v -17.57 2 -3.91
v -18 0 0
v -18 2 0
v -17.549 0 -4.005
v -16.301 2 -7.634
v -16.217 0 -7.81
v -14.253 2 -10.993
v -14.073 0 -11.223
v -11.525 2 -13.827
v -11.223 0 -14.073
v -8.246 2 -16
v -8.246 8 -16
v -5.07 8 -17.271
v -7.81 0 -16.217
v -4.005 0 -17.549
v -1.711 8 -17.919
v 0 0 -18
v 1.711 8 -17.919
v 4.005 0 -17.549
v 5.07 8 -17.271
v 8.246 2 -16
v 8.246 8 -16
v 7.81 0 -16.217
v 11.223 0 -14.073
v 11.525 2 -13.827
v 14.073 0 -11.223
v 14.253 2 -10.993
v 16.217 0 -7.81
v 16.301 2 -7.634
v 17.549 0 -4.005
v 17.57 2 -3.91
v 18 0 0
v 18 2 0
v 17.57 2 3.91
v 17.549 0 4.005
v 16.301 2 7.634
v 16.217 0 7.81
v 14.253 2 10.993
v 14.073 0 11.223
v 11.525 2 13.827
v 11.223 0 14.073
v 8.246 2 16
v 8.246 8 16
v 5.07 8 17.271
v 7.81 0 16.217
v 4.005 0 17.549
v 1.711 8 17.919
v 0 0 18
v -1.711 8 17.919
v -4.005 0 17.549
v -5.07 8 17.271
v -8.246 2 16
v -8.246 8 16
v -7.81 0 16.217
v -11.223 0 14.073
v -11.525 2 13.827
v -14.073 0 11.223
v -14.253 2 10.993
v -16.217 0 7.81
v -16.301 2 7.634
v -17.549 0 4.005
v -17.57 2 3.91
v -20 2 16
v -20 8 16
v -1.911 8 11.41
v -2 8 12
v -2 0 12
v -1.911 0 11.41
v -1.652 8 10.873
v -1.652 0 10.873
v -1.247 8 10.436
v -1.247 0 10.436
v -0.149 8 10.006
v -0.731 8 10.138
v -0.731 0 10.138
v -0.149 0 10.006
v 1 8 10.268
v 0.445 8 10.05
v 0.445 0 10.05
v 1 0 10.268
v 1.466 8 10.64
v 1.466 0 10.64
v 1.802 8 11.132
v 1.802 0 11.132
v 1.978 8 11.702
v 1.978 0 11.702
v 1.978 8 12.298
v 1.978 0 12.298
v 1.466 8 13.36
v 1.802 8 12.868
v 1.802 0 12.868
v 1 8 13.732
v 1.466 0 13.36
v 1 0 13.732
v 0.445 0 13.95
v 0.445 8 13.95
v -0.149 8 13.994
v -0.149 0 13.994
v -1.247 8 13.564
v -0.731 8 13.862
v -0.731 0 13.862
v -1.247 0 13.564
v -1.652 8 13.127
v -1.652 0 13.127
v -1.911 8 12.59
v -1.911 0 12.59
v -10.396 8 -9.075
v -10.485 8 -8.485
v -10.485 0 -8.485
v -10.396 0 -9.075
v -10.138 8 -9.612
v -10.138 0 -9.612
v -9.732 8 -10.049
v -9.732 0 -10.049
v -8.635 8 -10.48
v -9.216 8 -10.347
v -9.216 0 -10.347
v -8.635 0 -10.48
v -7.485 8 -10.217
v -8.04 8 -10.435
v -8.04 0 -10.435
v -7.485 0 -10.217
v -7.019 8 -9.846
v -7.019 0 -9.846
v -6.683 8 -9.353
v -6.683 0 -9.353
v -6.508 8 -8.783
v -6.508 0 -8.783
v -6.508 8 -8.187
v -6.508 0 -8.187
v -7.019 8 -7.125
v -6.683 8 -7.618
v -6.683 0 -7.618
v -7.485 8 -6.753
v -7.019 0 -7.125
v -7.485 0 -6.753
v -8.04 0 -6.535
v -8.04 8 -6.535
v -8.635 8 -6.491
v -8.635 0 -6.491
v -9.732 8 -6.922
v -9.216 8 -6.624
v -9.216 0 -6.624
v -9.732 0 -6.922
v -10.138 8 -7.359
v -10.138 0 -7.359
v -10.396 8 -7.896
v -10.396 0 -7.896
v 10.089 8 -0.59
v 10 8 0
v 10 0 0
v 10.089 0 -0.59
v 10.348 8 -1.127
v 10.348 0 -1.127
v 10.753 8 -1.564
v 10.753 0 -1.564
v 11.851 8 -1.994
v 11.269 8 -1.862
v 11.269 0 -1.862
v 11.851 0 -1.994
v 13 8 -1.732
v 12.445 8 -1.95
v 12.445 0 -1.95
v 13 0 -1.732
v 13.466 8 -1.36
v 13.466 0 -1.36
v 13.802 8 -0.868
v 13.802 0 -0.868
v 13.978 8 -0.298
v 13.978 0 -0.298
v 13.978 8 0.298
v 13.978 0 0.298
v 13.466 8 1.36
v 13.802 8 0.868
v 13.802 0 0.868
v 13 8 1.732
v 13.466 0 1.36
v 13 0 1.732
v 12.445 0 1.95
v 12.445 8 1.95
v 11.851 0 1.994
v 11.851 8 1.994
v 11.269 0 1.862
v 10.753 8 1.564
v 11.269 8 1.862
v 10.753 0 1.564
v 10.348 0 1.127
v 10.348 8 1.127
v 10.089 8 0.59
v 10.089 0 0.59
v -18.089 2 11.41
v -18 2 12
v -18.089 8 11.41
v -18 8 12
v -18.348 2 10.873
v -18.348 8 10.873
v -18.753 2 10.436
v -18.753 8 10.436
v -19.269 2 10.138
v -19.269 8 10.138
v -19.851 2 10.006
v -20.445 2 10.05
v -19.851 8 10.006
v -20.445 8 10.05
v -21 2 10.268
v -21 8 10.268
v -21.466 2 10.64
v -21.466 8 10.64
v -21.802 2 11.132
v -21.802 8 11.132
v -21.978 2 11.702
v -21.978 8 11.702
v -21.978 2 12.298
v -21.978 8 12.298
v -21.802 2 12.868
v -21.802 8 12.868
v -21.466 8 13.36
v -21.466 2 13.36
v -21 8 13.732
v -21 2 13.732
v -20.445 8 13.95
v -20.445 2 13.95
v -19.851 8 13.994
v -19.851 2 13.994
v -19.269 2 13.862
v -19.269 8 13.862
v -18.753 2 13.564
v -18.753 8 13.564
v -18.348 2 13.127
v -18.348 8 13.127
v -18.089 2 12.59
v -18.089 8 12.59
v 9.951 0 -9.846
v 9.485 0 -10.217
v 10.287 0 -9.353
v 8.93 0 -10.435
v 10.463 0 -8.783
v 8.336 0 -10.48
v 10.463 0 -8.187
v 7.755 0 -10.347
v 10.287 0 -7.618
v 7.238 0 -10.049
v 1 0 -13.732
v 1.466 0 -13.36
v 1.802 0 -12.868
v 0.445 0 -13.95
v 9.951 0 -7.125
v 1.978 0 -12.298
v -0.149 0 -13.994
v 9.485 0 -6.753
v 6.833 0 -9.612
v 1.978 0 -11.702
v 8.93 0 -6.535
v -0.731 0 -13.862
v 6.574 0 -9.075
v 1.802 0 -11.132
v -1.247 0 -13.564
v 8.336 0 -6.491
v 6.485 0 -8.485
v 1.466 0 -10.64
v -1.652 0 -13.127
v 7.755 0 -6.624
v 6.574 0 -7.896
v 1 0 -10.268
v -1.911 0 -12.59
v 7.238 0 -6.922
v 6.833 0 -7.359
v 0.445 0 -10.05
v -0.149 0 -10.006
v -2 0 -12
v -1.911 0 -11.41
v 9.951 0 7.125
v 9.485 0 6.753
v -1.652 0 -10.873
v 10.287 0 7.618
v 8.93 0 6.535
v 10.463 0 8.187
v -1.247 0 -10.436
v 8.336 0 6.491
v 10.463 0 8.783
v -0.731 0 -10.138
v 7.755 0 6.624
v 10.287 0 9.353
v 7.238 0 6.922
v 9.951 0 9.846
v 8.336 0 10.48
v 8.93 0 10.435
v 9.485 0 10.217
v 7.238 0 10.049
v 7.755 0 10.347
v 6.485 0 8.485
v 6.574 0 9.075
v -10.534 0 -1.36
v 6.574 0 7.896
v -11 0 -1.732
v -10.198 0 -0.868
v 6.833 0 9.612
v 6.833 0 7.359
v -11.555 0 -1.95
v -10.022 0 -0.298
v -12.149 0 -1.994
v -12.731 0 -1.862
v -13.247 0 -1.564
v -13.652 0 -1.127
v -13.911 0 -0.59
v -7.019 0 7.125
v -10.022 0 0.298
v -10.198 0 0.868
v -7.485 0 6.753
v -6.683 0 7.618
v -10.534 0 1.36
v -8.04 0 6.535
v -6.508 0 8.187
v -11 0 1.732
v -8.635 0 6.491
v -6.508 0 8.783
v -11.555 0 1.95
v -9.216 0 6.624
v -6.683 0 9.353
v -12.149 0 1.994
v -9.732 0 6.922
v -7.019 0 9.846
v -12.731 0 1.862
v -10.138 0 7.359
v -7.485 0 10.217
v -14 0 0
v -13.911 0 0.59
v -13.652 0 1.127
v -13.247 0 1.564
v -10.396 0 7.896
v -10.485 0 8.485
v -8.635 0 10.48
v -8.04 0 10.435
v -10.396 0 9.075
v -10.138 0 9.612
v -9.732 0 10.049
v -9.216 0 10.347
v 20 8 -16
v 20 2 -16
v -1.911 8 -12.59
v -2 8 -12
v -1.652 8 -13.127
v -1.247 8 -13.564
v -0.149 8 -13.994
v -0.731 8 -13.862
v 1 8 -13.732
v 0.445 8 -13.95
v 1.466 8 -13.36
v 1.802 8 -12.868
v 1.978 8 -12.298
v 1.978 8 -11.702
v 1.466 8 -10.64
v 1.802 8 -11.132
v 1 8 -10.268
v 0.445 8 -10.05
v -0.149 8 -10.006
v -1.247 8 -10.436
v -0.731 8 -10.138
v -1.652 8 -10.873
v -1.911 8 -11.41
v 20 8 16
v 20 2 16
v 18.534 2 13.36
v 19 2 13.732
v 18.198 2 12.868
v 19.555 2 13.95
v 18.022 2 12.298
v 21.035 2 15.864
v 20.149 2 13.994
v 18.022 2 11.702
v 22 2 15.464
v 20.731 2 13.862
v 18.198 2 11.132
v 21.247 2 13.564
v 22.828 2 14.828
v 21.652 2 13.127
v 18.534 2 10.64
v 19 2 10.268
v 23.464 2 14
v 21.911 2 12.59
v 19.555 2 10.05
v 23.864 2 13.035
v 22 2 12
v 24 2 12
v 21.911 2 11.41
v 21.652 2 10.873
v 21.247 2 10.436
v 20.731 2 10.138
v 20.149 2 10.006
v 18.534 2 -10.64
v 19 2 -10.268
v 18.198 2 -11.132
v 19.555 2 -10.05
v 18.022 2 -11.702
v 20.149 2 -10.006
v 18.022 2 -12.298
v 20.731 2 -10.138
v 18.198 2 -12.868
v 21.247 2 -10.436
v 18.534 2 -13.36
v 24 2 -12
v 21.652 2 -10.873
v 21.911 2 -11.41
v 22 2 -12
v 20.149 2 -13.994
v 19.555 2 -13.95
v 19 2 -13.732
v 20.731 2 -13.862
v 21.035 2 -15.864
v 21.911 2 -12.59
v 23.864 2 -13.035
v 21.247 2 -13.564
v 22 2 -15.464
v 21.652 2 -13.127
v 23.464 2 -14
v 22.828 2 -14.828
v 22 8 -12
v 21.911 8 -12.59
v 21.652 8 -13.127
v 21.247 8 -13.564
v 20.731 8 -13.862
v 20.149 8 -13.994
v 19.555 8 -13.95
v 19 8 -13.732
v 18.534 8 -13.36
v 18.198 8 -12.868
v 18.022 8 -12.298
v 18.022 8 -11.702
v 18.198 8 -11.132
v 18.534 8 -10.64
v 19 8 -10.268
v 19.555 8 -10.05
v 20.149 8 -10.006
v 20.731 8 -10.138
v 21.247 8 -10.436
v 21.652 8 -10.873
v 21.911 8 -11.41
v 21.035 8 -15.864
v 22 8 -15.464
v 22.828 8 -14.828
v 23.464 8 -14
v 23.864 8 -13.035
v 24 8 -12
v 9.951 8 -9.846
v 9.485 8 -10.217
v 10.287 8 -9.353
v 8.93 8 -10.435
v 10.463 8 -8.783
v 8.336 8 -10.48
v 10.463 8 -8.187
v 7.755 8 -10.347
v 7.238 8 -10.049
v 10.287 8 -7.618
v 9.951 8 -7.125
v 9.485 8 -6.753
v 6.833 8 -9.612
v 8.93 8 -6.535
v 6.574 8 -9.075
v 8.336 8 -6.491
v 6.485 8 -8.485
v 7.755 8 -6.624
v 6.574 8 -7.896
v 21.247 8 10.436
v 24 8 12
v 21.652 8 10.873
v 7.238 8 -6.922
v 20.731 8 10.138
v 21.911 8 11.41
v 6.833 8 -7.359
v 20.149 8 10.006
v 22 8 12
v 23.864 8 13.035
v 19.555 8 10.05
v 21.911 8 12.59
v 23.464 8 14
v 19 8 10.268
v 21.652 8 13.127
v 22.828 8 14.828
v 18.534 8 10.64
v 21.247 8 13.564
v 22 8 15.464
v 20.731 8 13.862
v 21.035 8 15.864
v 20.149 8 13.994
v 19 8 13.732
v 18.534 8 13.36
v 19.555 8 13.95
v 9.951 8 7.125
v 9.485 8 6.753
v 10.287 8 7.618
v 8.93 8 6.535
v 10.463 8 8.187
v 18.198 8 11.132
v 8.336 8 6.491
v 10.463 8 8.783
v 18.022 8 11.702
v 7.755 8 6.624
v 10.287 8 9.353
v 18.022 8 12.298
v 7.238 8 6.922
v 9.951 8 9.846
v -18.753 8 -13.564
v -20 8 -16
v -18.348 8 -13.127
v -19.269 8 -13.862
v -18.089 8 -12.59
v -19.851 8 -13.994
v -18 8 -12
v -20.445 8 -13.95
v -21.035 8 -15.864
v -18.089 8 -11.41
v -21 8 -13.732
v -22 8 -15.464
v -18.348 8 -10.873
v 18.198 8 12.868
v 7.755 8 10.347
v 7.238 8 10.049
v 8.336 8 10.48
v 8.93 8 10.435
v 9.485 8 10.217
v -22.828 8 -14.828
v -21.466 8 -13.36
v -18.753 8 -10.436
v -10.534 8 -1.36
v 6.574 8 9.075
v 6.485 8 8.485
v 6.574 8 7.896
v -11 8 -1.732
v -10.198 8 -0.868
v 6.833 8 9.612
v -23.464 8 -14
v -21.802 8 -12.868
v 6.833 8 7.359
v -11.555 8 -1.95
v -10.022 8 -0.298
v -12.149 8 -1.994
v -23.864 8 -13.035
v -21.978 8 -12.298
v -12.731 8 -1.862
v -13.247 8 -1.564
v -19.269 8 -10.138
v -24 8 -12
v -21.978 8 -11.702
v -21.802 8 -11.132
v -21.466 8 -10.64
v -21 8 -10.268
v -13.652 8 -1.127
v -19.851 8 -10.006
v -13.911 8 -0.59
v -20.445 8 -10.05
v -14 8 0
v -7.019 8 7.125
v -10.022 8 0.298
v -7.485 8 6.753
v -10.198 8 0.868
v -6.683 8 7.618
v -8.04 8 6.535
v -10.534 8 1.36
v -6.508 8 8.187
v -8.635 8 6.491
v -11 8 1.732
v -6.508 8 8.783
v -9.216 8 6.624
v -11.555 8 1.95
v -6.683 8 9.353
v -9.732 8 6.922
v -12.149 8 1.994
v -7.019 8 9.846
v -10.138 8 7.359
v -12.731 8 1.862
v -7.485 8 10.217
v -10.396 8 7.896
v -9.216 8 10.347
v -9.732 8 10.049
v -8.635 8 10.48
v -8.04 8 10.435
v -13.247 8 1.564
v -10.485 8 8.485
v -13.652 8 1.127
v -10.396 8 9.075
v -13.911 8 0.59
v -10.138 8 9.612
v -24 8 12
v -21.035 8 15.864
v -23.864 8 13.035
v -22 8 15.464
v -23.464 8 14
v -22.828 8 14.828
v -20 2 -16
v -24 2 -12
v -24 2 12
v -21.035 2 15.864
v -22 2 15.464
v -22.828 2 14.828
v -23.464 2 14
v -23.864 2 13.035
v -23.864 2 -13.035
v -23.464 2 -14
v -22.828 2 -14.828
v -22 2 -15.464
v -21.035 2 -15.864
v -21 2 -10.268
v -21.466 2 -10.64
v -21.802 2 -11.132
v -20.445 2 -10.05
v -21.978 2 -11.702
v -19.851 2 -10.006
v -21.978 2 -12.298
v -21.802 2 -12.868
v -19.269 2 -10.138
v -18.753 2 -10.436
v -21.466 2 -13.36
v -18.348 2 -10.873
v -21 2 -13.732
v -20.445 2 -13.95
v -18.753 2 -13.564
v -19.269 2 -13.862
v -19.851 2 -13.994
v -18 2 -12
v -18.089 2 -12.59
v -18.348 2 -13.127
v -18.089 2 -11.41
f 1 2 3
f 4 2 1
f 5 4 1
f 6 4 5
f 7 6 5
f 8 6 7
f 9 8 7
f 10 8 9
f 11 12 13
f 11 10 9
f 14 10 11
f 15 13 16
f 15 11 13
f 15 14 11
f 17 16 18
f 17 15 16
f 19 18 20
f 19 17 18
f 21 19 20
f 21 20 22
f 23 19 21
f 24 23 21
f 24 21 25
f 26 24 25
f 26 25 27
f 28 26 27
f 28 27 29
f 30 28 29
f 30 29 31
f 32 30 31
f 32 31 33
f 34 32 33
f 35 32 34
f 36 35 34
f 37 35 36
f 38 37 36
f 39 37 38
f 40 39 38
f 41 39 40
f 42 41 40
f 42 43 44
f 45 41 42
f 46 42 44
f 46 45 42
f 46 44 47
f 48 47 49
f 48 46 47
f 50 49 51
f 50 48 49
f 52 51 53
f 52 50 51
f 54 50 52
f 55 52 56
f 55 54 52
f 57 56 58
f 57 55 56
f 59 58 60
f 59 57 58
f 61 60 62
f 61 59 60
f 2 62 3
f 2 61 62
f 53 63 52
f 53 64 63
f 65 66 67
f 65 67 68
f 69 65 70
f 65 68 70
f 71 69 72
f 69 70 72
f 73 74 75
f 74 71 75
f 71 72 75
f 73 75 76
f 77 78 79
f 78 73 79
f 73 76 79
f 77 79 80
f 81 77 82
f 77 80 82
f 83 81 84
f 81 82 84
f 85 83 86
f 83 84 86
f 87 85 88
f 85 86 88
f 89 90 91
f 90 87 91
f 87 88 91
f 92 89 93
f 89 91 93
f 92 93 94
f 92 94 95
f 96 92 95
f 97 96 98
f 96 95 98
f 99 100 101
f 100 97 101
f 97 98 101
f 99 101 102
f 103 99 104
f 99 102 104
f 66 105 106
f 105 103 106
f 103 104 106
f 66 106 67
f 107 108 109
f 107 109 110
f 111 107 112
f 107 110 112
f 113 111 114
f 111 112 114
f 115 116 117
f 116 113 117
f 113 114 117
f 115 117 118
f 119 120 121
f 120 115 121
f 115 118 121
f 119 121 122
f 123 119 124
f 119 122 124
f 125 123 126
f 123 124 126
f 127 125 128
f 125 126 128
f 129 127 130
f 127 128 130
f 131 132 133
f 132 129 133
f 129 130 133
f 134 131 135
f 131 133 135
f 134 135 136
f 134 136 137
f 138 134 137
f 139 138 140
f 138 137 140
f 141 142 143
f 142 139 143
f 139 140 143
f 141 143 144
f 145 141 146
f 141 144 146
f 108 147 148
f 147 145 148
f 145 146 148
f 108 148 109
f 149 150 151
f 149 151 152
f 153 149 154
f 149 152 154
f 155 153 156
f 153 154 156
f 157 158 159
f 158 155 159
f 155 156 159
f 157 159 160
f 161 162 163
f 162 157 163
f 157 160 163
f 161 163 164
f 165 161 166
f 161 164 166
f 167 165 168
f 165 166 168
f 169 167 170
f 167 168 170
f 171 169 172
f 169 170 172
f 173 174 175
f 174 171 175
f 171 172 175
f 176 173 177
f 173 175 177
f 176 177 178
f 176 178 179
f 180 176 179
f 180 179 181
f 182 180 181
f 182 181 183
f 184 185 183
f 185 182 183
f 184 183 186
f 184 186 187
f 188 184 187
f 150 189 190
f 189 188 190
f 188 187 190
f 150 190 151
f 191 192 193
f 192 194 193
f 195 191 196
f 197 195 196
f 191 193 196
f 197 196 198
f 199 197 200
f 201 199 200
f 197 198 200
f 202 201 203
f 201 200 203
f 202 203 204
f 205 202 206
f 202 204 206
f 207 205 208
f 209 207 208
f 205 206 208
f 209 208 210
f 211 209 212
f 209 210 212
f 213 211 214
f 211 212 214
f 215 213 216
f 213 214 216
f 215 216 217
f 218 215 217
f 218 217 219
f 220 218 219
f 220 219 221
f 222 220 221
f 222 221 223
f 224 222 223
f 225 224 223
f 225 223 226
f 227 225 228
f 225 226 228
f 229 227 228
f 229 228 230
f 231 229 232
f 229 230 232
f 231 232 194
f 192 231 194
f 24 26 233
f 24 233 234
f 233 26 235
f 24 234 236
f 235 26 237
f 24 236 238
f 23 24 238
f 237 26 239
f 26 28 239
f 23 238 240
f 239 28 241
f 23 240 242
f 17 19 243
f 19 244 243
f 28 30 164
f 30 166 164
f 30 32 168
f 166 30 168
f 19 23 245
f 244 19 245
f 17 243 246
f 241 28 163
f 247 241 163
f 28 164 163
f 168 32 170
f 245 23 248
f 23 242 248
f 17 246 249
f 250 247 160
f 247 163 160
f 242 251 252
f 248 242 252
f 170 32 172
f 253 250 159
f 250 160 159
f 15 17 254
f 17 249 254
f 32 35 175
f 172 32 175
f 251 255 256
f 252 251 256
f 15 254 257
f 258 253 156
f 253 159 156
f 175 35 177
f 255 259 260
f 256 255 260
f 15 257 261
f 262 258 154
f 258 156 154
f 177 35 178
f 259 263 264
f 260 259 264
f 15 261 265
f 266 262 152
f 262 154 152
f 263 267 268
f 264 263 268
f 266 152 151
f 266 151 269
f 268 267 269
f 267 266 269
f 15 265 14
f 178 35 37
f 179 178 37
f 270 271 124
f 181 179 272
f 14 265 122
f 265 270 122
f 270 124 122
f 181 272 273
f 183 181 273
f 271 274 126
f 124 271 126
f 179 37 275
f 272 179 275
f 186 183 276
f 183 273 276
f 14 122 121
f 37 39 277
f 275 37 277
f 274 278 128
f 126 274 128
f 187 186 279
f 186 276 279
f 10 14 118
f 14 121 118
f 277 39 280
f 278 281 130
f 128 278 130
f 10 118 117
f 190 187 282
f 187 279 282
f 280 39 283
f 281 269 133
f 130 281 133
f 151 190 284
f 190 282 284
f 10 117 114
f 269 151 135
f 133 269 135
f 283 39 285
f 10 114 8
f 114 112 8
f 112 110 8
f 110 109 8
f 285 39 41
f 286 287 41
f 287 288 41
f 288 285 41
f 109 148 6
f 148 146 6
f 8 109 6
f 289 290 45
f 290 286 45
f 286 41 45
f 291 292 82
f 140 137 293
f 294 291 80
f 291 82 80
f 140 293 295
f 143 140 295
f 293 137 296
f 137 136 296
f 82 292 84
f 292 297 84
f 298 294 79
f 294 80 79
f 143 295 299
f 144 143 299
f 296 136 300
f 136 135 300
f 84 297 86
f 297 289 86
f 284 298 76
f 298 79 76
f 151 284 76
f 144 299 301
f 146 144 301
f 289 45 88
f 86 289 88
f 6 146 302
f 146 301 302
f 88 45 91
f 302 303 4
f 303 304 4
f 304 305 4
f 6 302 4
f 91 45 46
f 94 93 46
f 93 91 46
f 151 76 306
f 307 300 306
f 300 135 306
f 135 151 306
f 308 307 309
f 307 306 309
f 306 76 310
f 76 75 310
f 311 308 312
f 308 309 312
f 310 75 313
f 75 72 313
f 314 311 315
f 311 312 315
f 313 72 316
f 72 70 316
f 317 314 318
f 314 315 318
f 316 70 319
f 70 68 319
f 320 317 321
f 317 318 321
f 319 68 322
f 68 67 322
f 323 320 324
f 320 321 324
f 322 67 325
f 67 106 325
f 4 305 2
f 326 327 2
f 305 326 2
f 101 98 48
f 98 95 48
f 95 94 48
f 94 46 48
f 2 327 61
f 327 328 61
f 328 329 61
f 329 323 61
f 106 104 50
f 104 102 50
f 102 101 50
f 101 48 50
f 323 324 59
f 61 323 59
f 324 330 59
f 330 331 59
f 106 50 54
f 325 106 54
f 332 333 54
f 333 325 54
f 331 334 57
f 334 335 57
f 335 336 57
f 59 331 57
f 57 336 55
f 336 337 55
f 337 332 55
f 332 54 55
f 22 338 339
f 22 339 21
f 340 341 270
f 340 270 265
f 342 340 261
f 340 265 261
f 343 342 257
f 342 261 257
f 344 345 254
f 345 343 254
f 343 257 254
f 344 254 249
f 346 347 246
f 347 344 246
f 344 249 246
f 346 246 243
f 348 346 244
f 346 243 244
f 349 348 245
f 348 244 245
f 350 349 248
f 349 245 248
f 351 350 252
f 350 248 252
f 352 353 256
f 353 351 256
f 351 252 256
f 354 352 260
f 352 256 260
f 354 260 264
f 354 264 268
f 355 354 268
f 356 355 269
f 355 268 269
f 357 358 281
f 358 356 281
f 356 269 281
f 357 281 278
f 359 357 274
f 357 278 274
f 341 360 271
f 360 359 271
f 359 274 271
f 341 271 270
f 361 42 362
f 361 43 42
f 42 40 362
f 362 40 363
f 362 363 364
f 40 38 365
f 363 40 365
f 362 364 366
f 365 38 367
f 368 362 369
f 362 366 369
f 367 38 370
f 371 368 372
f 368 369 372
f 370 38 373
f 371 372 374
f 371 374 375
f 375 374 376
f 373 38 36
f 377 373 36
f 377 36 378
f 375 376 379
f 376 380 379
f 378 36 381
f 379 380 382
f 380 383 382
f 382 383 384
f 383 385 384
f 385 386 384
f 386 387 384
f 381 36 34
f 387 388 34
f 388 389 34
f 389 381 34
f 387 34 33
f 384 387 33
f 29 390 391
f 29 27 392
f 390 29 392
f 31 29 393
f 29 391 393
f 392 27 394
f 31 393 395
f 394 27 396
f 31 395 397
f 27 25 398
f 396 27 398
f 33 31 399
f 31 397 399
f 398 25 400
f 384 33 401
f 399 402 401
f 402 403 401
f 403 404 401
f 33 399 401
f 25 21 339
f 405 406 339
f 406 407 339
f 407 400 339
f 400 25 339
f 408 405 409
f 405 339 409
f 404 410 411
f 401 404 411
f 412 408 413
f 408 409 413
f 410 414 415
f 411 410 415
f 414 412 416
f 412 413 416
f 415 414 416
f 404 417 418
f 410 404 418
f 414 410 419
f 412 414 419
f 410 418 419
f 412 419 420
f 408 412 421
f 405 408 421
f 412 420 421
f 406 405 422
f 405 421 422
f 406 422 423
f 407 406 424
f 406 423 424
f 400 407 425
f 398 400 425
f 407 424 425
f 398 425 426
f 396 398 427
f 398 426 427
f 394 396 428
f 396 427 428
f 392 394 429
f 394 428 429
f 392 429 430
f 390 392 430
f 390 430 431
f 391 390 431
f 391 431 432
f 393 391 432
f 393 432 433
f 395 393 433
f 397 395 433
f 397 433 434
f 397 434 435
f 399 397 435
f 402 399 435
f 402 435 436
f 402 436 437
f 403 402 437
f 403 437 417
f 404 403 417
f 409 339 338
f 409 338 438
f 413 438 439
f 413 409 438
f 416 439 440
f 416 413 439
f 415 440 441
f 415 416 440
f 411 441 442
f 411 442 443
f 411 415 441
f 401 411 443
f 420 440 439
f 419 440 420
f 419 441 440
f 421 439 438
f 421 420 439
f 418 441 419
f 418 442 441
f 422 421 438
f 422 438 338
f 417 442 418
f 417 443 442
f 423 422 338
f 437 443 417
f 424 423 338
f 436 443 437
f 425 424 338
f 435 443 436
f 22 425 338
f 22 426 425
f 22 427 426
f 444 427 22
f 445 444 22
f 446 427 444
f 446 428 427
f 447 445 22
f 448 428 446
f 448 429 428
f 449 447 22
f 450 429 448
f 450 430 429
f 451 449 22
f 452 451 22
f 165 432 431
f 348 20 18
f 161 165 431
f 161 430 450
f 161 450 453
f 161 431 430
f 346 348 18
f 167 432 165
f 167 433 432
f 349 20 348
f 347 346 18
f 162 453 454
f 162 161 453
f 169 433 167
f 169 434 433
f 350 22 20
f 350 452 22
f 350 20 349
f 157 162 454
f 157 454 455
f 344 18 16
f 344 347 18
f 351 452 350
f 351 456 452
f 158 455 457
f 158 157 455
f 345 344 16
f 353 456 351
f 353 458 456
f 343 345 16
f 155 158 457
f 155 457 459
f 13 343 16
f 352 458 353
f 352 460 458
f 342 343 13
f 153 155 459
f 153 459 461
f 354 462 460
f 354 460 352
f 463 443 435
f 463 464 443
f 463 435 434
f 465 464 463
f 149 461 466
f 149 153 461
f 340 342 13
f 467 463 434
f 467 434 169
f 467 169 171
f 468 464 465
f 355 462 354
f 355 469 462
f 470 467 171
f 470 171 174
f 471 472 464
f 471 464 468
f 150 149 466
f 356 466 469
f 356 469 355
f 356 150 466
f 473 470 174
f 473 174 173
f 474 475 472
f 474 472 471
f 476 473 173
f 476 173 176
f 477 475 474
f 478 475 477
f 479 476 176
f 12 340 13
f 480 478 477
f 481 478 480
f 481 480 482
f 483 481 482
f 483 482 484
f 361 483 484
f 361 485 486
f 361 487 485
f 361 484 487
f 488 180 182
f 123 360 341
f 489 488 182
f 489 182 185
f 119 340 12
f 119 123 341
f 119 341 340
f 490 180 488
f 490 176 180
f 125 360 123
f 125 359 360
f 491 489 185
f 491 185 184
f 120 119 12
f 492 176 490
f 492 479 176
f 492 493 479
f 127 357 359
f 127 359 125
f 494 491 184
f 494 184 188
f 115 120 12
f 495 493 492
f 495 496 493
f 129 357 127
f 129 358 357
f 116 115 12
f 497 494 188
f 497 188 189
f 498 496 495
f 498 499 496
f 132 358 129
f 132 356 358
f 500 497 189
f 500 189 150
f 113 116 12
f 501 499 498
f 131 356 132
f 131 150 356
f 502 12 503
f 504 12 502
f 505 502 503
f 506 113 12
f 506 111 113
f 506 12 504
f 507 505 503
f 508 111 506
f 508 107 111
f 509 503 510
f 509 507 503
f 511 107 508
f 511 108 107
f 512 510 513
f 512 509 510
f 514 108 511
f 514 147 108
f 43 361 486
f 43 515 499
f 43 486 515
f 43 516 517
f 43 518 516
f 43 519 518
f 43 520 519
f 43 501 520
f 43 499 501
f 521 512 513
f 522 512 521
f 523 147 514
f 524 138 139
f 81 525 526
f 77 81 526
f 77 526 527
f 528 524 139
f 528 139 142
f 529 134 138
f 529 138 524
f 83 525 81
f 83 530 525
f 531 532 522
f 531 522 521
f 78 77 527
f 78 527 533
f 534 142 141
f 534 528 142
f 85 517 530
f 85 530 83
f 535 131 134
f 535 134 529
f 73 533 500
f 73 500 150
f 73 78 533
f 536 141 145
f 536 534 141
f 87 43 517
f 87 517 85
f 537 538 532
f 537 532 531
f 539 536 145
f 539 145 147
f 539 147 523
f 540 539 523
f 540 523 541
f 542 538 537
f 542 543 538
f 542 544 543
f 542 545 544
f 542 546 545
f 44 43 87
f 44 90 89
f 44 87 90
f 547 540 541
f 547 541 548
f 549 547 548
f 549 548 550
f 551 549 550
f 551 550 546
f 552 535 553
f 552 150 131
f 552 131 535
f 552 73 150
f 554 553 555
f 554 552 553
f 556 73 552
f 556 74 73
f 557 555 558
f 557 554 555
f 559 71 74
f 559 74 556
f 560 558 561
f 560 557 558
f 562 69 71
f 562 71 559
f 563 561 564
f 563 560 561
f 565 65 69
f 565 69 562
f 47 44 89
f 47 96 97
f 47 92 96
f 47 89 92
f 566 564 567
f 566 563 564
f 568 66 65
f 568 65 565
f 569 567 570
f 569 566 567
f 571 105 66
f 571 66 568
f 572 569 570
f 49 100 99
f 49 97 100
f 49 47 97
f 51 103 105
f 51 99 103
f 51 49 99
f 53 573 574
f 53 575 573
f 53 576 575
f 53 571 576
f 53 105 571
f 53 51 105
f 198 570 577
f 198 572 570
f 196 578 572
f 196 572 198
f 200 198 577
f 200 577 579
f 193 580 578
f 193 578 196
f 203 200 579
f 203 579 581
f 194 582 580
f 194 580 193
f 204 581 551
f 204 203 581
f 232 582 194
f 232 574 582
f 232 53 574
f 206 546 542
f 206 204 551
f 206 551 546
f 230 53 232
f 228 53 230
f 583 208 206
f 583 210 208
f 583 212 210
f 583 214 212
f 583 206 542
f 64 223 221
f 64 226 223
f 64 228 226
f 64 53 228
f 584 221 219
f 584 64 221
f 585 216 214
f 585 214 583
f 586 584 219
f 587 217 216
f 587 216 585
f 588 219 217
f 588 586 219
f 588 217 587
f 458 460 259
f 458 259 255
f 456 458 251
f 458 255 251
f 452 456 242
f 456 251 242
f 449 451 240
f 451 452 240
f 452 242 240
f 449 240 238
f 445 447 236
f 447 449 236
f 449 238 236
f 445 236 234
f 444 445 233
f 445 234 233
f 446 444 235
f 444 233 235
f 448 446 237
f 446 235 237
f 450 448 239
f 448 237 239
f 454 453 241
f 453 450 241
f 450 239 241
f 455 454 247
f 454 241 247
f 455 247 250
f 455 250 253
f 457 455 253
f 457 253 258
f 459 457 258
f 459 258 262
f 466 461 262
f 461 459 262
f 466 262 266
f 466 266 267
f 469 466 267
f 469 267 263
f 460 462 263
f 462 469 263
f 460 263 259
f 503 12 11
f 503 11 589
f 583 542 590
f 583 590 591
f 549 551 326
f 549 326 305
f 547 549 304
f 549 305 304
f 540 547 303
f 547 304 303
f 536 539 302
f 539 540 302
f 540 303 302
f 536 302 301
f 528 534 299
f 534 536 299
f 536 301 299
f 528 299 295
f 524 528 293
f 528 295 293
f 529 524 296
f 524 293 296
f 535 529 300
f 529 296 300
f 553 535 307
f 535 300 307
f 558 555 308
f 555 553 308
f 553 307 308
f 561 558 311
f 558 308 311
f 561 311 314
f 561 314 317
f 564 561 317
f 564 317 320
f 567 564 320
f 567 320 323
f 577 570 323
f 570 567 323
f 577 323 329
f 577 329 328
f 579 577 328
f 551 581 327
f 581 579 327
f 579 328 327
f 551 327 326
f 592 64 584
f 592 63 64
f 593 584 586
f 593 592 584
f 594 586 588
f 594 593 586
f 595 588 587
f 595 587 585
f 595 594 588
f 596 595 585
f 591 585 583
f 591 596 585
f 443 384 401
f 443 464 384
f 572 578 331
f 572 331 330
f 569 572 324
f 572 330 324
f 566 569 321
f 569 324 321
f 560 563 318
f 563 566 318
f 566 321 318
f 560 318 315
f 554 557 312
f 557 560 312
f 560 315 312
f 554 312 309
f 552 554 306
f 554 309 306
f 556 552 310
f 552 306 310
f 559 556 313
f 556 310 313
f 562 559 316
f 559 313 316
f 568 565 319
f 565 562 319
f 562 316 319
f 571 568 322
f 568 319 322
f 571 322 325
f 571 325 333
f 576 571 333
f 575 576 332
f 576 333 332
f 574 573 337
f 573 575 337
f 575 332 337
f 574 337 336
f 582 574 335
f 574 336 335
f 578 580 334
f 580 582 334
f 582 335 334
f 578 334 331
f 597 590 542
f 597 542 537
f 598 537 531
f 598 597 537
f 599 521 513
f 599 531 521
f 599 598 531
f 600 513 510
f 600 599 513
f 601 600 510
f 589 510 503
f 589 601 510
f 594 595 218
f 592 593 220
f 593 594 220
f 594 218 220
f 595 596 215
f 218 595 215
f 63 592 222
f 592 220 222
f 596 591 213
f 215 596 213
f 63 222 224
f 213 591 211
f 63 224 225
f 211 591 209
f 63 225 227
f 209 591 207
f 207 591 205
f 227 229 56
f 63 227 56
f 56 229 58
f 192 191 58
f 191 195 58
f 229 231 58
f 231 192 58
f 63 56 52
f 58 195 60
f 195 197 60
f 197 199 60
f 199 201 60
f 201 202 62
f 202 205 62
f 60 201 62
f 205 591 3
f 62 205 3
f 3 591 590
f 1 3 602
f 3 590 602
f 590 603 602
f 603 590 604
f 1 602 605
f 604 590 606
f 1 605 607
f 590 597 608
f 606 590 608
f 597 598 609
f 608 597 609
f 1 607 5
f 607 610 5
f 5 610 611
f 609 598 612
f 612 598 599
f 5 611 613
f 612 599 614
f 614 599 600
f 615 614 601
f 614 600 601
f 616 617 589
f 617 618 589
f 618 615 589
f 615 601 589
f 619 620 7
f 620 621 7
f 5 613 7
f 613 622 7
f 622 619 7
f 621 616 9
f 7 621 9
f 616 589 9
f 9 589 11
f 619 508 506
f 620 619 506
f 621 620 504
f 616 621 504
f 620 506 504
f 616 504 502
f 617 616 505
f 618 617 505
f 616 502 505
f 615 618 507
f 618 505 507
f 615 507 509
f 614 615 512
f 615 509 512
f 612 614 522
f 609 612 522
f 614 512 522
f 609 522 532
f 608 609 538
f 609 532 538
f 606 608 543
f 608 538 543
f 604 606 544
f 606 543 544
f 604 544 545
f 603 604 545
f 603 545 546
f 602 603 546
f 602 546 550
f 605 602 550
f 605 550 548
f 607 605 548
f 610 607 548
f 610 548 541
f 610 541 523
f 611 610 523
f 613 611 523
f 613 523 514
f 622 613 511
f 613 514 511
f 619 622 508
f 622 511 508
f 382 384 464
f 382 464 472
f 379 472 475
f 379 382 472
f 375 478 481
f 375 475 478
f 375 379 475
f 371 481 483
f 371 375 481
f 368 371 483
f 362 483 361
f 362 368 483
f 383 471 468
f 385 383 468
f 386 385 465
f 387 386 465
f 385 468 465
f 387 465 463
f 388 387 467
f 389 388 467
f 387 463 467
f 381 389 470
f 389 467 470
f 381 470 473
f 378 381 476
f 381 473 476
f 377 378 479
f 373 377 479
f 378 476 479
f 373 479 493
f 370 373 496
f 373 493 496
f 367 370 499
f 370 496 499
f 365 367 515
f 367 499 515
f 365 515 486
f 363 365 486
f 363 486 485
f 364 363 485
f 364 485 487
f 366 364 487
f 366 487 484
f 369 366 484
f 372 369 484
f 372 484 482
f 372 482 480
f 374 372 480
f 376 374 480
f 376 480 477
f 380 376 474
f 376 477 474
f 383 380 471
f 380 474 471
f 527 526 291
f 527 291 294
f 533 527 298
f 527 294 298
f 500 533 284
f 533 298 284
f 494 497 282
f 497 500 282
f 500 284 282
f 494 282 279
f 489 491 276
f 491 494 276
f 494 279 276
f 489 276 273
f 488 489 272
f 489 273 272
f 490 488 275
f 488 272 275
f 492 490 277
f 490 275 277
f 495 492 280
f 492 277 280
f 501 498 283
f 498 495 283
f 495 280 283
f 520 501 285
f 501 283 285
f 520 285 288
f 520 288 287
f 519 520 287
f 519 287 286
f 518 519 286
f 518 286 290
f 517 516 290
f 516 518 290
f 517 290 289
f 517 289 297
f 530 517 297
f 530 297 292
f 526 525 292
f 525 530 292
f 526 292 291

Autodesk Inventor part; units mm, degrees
ref_plane "YZ Plane" through (0, 0, 0) normal (1, 0, 0) x (0, 1, 0)
ref_plane "XZ Plane" through (0, 0, 0) normal (0, 1, 0) x (-1, 0, 0)
ref_plane "XY Plane" through (0, 0, 0) normal (0, 0, 1) x (1, 0, 0)
sketch "Sketch1" plane through (0, 0, 0) normal (0, 1, 0) x (-1, 0, 0)
  circle A0 centre (0, 0) radius 18
  circle A1 centre (0, -12) radius 2
  circle A2 centre (8.4853, -8.4853) radius 2
  circle A3 centre (12, 0) radius 2
  circle A4 centre (8.4853, 8.4853) radius 2
  circle A5 centre (0, 12) radius 2
  circle A6 centre (-8.4853, 8.4853) radius 2
  circle A7 centre (-12, 0) radius 2
  circle A8 centre (-8.4853, -8.4853) radius 2
  dimension "d0" = 36
  dimension "d1" = 4
  dimension "d2" = 12
  dimension "d5" = 360
extrude "Extrusion1" add sketch "Sketch1" along normal blind 8
thread "Thread1" size "M4x0.7" class "6H" standard "ANSI Metric M Profile" full length
thread "Thread2" size "M4x0.7" class "6H" standard "ANSI Metric M Profile" full length
thread "Thread3" size "M4x0.7" class "6H" standard "ANSI Metric M Profile" full length
thread "Thread4" size "M4x0.7" class "6H" standard "ANSI Metric M Profile" full length
thread "Thread5" size "M4x0.7" class "6H" standard "ANSI Metric M Profile" full length
thread "Thread6" size "M4x0.7" class "6H" standard "ANSI Metric M Profile" full length
thread "Thread7" size "M4x0.7" class "6H" standard "ANSI Metric M Profile" full length
thread "Thread8" size "M4x0.7" class "6H" standard "ANSI Metric M Profile" full length
sketch "Sketch2" plane through (0, 8, 0) normal (0, 1, 0) x (1, 0, 0)
  line L0 (-24, -16) -> (24, -16)
  line L1 (24, -16) -> (24, 16)
  line L2 (24, 16) -> (-24, 16)
  line L3 (-24, 16) -> (-24, -16)
  line L4 (-24, -16) -> (24, 16) construction
  line L5 (24, -16) -> (-24, 16) construction
  circle A0 centre (-20, 12) radius 2
  line L6 (0, 0) -> (0, -16) construction
  line L7 (0, 0) -> (24, 0) construction
  circle A1 centre (0, 0) radius 18 projected
  circle A2 centre (8.4853, 8.4853) radius 2 projected
  circle A3 centre (12, 0) radius 2 projected
  circle A4 centre (8.4853, -8.4853) radius 2 projected
  circle A5 centre (0, -12) radius 2 projected
  circle A6 centre (-8.4853, -8.4853) radius 2 projected
  circle A7 centre (-12, 0) radius 2 projected
  circle A8 centre (-8.4853, 8.4853) radius 2 projected
  circle A9 centre (0, 12) radius 2 projected
  circle A10 centre (20, 12) radius 2
  circle A11 centre (-20, -12) radius 2
  circle A12 centre (20, -12) radius 2
  point P0 (8.2462, 16)
  point P1 (8.2462, -16)
  point P2 (-8.2462, -16)
  point P3 (-8.2462, 16)
  dimension "d25" = 48
  dimension "d26" = 32
  dimension "d27" = 4
  dimension "d28" = 20
  dimension "d29" = 12
extrude "Extrusion2" add sketch "Sketch2" against normal blind 6 contours L3 L2 A1 L0 | A1 L2 L1 L0
fillet "Fillet1" radius 4 4 edges at (-24, 5, 16) (24, 5, 16) (24, 5, -16) (-24, 5, -16)
thread "Thread9" size "M4.5x0.75" class "6H" standard "ANSI Metric M Profile" full length
thread "Thread10" size "M4.5x0.75" class "6H" standard "ANSI Metric M Profile" full length
thread "Thread11" size "M4.5x0.75" class "6H" standard "ANSI Metric M Profile" full length
thread "Thread12" size "M4.5x0.75" class "6H" standard "ANSI Metric M Profile" full length
properties part number "ArmBearingClampingPlate2" material "Aluminum 6061"
